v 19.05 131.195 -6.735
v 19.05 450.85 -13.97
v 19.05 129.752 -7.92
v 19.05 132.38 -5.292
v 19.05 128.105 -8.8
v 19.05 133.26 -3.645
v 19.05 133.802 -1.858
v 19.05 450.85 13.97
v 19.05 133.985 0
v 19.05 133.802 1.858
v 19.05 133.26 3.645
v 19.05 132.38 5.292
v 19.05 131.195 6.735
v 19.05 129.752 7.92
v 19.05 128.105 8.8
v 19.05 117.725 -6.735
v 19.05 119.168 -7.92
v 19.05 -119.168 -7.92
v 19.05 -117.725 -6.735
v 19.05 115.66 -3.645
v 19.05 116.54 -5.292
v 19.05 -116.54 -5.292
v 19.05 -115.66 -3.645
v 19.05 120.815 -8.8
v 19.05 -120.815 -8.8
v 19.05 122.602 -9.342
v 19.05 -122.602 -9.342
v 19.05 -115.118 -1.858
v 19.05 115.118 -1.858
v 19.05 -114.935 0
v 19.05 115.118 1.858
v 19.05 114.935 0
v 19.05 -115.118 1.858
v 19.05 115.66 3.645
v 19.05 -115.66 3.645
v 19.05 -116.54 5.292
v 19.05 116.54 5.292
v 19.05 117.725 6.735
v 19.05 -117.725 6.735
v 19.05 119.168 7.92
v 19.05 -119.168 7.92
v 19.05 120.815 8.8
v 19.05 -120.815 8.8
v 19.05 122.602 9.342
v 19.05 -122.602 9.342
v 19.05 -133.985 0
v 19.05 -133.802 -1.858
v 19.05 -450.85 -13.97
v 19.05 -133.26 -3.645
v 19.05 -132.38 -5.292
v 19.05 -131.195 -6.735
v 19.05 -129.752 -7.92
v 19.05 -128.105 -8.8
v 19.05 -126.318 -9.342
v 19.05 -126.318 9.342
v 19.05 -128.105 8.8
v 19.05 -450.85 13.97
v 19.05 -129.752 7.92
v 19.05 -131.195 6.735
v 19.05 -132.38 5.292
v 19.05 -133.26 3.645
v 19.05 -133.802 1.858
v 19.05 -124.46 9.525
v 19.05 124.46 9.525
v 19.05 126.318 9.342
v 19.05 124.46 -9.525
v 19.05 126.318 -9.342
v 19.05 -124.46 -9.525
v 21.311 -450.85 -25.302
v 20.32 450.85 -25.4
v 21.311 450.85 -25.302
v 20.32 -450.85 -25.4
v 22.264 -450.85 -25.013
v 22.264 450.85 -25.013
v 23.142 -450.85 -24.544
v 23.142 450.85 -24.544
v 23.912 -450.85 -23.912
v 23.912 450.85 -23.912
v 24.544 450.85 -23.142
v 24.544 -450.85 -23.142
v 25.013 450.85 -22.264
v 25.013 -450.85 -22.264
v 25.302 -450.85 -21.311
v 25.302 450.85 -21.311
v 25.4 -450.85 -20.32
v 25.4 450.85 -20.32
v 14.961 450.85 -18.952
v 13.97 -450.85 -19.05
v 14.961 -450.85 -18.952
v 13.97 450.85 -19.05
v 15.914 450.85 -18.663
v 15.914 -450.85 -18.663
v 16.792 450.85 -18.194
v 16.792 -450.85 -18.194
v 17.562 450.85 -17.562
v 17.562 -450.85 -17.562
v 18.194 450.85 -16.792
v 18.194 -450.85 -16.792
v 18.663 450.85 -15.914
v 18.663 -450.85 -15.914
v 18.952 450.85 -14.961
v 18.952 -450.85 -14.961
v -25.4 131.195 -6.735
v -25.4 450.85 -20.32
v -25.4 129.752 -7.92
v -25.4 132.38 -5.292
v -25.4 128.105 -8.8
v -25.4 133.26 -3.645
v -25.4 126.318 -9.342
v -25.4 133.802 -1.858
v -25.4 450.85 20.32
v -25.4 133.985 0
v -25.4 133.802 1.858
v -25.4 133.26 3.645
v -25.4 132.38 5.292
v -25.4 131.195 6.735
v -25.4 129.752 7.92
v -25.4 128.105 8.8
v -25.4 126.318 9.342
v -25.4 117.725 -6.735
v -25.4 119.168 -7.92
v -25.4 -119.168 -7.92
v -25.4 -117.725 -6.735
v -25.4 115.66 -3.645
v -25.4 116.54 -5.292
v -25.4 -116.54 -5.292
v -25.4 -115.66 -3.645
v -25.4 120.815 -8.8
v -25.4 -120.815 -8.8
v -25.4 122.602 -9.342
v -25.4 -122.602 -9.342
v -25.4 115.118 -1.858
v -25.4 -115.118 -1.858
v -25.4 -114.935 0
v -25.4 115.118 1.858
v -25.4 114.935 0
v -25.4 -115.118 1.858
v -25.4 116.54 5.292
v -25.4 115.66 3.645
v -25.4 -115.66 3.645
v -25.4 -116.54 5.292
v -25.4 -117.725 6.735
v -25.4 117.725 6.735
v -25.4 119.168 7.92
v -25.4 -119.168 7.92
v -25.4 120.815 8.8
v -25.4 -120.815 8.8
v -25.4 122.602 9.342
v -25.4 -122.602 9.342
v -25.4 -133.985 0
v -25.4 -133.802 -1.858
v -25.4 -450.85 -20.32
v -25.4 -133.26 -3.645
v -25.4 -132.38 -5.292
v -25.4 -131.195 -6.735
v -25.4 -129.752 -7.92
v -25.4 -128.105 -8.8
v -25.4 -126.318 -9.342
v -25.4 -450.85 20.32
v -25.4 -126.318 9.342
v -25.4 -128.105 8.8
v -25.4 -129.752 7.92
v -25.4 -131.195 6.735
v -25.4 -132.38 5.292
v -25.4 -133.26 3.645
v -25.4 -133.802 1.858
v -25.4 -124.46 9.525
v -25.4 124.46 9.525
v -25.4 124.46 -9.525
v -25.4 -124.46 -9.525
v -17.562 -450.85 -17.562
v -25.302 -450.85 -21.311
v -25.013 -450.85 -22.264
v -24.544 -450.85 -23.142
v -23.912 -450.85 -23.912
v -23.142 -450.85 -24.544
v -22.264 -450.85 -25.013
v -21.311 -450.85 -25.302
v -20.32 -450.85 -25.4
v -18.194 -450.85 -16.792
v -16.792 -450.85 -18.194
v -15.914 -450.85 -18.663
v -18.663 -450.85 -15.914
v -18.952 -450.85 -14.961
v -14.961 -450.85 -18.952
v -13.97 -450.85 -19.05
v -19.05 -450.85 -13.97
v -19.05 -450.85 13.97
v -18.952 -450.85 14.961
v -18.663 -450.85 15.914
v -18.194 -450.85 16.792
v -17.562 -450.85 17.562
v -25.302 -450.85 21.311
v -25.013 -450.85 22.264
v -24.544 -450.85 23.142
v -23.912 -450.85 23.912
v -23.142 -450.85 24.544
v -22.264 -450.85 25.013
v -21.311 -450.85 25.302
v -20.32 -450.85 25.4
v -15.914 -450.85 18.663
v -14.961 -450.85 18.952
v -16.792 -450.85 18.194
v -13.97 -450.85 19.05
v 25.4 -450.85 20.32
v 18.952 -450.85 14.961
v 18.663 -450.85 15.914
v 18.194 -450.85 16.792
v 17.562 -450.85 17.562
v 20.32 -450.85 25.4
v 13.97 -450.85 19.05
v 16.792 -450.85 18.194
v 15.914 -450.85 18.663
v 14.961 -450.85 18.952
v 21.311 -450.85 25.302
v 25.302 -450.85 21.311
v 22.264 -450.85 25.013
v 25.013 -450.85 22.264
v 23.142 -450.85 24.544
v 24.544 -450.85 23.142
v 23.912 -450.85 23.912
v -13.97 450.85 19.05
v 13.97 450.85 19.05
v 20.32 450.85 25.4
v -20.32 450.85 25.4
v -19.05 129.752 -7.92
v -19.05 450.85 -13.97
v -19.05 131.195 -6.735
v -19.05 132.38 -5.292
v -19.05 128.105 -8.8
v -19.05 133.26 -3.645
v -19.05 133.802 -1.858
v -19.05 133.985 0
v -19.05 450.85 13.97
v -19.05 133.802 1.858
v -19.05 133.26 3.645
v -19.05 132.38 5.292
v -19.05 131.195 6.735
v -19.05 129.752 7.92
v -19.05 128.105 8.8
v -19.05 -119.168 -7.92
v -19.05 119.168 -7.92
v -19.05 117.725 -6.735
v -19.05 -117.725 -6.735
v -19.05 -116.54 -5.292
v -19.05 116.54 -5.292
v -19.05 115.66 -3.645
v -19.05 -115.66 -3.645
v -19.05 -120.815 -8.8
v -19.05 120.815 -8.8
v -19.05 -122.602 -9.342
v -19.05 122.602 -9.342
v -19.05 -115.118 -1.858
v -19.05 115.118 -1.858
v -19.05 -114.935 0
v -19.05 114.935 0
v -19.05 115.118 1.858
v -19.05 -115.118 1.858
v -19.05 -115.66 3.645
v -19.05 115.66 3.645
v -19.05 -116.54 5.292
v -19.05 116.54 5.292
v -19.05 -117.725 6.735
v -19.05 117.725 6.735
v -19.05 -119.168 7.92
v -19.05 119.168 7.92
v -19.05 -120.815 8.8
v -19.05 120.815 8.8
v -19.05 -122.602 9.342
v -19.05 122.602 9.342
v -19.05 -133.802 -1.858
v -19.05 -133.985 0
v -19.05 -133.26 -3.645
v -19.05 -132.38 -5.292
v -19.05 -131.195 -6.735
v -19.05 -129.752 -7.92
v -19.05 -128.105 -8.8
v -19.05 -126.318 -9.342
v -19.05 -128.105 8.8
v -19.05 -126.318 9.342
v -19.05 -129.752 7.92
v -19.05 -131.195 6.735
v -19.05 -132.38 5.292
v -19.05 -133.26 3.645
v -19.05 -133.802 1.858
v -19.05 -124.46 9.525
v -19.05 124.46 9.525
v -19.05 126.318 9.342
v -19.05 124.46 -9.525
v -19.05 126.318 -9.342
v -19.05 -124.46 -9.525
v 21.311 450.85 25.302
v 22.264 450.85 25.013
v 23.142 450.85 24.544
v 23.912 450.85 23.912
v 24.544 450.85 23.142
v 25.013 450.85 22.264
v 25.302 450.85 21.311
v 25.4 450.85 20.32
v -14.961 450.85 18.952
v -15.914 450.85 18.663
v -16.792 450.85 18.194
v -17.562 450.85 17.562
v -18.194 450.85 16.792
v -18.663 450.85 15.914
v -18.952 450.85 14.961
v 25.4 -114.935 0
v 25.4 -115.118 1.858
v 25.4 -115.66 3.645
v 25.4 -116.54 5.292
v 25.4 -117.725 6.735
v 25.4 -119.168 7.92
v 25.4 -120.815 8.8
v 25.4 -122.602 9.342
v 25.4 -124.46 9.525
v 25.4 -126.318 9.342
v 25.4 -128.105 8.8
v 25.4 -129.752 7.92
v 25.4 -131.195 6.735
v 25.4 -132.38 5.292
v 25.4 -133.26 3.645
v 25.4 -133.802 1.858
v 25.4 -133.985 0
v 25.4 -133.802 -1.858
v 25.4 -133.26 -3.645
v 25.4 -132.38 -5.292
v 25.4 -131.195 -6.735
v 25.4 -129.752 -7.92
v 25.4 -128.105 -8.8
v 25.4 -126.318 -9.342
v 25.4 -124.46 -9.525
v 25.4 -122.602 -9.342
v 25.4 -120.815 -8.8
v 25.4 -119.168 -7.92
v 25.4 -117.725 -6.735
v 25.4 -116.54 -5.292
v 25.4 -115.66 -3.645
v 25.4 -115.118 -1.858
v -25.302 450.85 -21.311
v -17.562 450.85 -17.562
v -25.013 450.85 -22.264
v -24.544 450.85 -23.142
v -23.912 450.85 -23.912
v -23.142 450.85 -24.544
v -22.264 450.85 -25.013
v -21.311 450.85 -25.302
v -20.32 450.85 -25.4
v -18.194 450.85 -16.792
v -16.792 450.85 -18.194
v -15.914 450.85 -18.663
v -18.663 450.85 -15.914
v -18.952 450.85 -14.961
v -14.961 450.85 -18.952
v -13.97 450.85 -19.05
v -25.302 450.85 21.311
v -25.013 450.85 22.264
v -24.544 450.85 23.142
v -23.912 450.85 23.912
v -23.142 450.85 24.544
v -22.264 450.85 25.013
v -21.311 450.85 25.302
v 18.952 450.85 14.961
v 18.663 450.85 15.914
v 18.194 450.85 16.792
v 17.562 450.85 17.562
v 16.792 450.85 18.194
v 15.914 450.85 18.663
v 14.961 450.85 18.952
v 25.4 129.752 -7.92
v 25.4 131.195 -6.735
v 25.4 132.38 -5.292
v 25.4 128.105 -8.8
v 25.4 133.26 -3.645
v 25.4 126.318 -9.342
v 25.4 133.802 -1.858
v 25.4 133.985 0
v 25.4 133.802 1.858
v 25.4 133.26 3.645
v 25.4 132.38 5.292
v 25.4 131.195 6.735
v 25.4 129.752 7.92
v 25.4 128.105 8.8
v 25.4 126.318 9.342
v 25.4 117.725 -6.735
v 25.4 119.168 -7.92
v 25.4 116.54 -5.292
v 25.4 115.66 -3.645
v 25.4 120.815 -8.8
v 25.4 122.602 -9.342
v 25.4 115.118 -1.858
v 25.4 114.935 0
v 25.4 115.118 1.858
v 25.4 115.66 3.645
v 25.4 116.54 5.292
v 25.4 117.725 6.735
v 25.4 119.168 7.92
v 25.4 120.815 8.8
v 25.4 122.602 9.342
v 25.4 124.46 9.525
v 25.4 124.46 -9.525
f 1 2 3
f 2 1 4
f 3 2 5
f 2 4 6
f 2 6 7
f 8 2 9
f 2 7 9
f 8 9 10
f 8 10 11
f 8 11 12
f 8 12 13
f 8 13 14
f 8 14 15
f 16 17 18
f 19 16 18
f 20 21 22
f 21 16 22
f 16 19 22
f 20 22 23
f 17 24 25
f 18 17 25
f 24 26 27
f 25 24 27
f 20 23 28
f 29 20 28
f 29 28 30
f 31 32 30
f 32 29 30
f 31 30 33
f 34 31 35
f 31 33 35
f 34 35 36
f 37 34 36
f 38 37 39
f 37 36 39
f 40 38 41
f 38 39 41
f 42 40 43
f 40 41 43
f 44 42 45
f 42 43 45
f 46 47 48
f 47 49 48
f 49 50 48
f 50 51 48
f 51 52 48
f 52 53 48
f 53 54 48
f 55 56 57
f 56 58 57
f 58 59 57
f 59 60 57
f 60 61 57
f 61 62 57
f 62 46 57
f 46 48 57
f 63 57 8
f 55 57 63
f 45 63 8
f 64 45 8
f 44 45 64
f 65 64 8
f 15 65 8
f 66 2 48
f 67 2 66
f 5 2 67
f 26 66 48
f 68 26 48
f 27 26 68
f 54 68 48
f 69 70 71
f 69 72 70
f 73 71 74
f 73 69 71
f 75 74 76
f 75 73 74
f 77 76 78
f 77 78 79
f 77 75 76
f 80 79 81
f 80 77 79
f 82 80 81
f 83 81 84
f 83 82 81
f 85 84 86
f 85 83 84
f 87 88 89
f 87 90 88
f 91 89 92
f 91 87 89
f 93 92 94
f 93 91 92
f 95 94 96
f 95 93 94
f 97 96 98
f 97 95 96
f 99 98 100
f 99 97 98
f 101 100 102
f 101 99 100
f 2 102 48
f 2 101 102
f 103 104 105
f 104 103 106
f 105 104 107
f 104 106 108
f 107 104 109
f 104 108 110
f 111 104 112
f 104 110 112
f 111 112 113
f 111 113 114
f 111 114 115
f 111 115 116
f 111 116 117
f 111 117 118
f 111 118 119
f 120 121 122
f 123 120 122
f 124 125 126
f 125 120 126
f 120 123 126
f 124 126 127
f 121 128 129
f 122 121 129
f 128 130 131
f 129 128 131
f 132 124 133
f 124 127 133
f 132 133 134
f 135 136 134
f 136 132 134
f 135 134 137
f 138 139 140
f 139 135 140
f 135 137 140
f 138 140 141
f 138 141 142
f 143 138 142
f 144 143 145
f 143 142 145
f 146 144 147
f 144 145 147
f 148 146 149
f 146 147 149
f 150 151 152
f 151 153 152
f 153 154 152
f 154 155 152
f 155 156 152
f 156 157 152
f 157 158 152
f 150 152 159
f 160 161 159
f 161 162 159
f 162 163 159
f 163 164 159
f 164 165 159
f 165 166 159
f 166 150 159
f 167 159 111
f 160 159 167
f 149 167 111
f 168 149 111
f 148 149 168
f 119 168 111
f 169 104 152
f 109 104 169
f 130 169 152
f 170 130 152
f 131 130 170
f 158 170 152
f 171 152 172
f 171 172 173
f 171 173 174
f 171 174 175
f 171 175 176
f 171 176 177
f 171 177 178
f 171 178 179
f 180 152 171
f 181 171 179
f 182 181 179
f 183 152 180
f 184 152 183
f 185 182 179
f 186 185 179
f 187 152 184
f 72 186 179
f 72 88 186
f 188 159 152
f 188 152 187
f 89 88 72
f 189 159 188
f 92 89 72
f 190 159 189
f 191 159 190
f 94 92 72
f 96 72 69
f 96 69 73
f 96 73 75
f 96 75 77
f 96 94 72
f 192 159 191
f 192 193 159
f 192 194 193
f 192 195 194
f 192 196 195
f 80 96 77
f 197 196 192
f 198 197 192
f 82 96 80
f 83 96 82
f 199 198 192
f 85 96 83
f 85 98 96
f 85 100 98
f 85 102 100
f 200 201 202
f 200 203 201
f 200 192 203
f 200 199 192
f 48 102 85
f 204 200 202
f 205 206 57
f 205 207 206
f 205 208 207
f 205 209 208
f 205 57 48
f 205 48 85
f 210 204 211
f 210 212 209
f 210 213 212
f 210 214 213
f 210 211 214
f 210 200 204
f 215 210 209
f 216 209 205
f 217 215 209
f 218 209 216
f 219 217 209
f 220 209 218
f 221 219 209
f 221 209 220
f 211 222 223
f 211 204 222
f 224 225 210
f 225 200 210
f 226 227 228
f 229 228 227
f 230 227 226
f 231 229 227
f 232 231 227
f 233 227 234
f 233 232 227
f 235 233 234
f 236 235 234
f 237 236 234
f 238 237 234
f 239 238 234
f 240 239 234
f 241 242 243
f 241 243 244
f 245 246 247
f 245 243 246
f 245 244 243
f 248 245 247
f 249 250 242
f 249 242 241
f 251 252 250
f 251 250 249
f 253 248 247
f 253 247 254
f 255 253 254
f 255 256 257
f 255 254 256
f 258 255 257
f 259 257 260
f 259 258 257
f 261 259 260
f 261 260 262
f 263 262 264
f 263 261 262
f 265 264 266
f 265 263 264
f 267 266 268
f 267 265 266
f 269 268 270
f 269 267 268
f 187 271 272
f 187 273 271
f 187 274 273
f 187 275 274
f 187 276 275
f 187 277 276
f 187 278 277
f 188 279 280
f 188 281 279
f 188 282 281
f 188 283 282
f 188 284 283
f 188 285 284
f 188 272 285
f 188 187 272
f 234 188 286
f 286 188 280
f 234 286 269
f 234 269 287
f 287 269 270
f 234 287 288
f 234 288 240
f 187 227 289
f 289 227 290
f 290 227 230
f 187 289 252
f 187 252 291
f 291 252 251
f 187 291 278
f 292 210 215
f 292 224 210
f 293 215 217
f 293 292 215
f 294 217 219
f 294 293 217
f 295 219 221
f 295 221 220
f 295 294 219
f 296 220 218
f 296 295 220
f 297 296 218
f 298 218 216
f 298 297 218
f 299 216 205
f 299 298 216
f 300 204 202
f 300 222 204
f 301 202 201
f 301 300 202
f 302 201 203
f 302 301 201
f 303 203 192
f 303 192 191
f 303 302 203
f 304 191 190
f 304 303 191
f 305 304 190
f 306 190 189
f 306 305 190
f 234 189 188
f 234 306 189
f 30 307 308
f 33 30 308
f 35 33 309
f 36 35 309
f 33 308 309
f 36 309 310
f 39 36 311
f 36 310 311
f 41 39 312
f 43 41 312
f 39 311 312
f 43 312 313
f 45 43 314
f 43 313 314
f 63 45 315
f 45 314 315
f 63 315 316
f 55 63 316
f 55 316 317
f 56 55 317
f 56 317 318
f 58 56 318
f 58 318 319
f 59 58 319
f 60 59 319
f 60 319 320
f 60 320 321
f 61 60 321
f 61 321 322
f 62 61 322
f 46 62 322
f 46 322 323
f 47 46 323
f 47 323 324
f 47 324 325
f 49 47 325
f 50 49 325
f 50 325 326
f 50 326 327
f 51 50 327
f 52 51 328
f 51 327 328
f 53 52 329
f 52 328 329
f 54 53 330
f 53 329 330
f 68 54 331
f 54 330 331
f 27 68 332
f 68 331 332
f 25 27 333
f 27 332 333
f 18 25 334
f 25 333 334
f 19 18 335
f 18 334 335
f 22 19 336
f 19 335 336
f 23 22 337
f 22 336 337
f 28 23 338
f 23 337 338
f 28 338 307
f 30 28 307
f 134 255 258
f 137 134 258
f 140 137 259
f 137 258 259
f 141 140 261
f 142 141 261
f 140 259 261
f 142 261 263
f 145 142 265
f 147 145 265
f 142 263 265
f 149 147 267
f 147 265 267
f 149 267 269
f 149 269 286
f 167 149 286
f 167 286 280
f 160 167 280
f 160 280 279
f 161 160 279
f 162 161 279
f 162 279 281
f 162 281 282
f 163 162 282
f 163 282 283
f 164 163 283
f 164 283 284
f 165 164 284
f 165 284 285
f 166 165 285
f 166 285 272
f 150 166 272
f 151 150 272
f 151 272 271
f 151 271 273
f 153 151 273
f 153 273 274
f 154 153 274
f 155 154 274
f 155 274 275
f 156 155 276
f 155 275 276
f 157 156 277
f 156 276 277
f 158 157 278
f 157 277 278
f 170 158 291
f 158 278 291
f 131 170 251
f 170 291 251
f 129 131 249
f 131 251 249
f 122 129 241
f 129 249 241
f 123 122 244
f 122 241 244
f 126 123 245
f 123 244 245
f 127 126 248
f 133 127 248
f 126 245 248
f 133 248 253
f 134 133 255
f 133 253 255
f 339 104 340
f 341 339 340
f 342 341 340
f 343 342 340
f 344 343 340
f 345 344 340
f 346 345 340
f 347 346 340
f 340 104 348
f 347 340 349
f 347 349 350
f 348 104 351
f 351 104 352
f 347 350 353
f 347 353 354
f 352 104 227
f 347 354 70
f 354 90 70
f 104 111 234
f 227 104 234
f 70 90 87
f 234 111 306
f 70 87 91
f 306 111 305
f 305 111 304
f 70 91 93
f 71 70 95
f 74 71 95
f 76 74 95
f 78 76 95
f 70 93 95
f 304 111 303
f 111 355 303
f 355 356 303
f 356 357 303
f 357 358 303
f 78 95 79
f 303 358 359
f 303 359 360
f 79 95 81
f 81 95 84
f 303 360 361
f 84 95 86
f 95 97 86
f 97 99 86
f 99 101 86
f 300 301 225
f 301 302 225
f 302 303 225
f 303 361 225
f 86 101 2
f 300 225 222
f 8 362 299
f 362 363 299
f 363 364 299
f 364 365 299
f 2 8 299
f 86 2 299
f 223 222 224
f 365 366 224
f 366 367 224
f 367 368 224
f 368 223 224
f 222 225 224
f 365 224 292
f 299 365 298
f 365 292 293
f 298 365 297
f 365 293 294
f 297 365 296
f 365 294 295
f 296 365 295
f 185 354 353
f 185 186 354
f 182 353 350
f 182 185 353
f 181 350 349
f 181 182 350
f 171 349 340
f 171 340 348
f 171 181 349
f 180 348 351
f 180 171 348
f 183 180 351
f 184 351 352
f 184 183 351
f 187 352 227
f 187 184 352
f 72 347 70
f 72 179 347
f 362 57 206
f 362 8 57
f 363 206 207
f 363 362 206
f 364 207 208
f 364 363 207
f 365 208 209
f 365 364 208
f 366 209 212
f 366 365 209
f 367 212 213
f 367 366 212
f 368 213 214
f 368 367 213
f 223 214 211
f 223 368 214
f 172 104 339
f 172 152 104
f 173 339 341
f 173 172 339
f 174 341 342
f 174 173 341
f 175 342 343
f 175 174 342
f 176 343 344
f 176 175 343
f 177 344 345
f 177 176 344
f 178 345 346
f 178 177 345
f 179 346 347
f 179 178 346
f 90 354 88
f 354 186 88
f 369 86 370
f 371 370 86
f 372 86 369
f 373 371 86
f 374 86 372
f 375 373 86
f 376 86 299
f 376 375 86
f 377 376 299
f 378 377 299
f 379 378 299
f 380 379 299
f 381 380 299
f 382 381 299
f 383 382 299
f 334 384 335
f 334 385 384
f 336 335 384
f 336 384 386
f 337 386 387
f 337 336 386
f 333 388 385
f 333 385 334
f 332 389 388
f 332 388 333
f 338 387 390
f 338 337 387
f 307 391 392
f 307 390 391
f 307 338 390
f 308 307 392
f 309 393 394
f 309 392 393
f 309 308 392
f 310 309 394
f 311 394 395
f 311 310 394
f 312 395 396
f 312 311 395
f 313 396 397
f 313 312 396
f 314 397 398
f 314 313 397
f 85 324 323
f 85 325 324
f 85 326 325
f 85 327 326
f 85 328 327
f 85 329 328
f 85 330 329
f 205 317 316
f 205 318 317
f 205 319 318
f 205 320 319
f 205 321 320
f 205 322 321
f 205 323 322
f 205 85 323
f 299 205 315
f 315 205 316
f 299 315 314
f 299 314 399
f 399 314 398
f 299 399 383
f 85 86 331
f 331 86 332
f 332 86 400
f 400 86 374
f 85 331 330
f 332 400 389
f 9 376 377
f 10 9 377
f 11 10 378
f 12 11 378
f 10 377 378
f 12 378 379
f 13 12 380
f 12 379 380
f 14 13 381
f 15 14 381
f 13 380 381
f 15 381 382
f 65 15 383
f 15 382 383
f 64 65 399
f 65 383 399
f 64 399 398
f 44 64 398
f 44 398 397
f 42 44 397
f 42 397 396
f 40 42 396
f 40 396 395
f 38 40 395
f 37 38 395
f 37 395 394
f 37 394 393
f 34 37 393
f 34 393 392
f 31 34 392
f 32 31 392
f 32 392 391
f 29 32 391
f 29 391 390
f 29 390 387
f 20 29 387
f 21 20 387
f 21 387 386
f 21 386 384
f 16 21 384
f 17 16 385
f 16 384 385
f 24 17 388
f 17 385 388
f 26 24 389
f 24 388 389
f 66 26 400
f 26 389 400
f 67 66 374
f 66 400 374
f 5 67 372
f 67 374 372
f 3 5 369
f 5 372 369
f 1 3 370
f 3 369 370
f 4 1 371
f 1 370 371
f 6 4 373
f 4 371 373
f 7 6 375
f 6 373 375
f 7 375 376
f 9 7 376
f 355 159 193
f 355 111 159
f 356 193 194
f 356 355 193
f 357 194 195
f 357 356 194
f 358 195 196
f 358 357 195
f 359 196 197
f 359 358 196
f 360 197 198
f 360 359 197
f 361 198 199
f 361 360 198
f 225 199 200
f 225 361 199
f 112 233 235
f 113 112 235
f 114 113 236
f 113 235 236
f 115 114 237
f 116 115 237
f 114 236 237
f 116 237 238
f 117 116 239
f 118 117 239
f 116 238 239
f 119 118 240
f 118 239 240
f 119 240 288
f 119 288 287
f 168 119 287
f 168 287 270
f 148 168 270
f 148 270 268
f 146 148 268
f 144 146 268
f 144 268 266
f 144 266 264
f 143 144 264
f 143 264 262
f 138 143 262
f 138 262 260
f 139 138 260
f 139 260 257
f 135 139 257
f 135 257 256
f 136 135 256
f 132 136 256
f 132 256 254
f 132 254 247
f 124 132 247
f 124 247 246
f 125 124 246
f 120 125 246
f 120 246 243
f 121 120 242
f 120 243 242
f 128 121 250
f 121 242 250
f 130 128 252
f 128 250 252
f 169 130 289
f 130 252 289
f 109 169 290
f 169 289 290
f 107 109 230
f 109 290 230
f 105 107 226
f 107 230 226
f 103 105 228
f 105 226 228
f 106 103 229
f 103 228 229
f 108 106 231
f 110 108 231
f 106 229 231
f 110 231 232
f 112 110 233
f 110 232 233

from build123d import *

# Parameters (mm, degrees)
F0_W     = 50.8
F0_H     = 50.8
F0_W_2   = 38.1
F0_H_2   = 38.1
F1_DEPTH = 450.85
F2_R     = 9.525
F3_DEPTH = 50.801
F4_R     = 5.08


with BuildPart() as f1:
    # F0 (on Front) → F1 (new body, symmetric)
    with BuildSketch(Plane.XZ):
        Rectangle(F0_W, F0_H)
        Rectangle(F0_W_2, F0_H_2, mode=Mode.SUBTRACT)
    extrude(amount=F1_DEPTH, both=True)

    # F2 (on face) → F3 (cut, through all)
    with BuildSketch(Plane.YZ.offset(25.4)):
        with Locations((-124.46, 0)):
            Circle(F2_R)
        with Locations((124.46, 0)):
            Circle(F2_R)
    extrude(amount=-F3_DEPTH, mode=Mode.SUBTRACT)

    # F4
    f4_edges = [f1.edges().sort_by_distance(p)[0] for p in [
        (-25.4, 0, 25.4),
        (25.4, 0, 25.4),
        (19.05, 0, -19.05),
        (-19.05, 0, -19.05),
        (-25.4, 0, -25.4),
        (25.4, 0, -25.4),
        (19.05, 0, 19.05),
        (-19.05, 0, 19.05),
    ]]
    fillet(f4_edges, radius=F4_R)


solid = f1.part
